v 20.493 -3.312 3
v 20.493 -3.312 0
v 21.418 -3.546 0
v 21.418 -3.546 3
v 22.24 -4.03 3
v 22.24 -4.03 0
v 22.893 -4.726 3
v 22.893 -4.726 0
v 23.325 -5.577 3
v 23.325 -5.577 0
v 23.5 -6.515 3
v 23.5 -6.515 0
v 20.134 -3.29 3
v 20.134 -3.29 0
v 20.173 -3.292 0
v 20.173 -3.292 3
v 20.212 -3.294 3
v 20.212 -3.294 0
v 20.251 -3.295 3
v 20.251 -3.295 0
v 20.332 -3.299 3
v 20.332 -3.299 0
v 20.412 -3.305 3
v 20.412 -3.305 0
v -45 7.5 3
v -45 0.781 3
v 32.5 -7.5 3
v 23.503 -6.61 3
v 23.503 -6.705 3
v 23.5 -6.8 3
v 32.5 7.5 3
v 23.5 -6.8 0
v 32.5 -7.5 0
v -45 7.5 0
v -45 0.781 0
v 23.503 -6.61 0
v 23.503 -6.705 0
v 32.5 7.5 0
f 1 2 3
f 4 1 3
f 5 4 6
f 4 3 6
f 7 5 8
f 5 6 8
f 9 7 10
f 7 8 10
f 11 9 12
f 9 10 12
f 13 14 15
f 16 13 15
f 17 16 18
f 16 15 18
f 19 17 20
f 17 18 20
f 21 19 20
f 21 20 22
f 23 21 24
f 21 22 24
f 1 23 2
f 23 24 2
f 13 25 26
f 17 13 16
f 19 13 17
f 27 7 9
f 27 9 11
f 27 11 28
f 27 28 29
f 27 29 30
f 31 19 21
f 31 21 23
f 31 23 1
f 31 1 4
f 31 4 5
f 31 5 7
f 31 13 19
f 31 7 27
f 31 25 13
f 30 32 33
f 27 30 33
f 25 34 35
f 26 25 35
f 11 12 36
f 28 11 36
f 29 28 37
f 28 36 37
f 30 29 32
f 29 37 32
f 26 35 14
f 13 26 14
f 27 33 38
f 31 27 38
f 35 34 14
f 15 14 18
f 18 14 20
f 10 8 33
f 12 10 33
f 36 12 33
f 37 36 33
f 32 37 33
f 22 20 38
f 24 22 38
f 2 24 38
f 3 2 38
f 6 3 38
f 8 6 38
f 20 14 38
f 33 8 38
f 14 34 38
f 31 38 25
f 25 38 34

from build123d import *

# Parameters (mm, degrees)
F2_DEPTH    = 3
F3_T1_DEPTH = 3.3473896723


# Not quite as in the source:
# - a fillet or chamfer that OpenCascade refuses, or shapes differently, is made with other operations: its cross-section is extruded or revolved along the edge and cut away or added


with BuildPart() as f2:
    # F1 (on face) → F2 (new body)
    with BuildSketch(Plane.XY):
        with BuildLine():
            Line((23.5, -3.5), (20.4928553643, -3.3120534603))
            ThreePointArc((20.4928553643, -3.3120534603), (22.5915627309, -4.3550902955), (23.5, -6.5154699331))
            Line((23.5, -6.5154699331), (23.5, -3.5))
        make_face()
        with BuildLine():
            Line((-32.5, 7.5), (-32.5, 0))
            Line((-32.5, 0), (20.2037399466, -3.2939837467))
            ThreePointArc((20.2037399466, -3.2939837467), (20.3484922252, -3.2999054879), (20.4928553643, -3.3120534603))
            Line((20.4928553643, -3.3120534603), (23.5, -3.5))
            Line((23.5, -3.5), (23.5, -6.5154699331))
            ThreePointArc((23.5, -6.5154699331), (23.5030092301, -6.6577349666), (23.5, -6.8))
            Line((23.5, -6.8), (32.5, -7.5))
            Line((32.5, -7.5), (32.5, 7.5))
            Line((32.5, 7.5), (-32.5, 7.5))
        make_face()
        Polygon((-45, 0.78125), (-32.5, 0), (-32.5, 7.5), (-45, 7.5), align=None)
    extrude(amount=F2_DEPTH)

    # F3: fillet of radius 4 on 1 edges, made by hand

    # F3_s2 → F3_t1 (cut)
    with BuildSketch(Plane.XY.offset(-0.1736948361)):
        with BuildLine():
            ThreePointArc((20.134397315, -3.2896498322), (20.1925204005, -3.2928581253), (20.2506840199, -3.2952202421))
            ThreePointArc((20.2506840199, -3.2952202421), (20.2272141407, -3.2945200871), (20.2037399466, -3.2939837467))
            Line((20.2037399466, -3.2939837467), (20.134397315, -3.2896498322))
        make_face()
    extrude(amount=F3_T1_DEPTH, mode=Mode.SUBTRACT)


solid = f2.part
